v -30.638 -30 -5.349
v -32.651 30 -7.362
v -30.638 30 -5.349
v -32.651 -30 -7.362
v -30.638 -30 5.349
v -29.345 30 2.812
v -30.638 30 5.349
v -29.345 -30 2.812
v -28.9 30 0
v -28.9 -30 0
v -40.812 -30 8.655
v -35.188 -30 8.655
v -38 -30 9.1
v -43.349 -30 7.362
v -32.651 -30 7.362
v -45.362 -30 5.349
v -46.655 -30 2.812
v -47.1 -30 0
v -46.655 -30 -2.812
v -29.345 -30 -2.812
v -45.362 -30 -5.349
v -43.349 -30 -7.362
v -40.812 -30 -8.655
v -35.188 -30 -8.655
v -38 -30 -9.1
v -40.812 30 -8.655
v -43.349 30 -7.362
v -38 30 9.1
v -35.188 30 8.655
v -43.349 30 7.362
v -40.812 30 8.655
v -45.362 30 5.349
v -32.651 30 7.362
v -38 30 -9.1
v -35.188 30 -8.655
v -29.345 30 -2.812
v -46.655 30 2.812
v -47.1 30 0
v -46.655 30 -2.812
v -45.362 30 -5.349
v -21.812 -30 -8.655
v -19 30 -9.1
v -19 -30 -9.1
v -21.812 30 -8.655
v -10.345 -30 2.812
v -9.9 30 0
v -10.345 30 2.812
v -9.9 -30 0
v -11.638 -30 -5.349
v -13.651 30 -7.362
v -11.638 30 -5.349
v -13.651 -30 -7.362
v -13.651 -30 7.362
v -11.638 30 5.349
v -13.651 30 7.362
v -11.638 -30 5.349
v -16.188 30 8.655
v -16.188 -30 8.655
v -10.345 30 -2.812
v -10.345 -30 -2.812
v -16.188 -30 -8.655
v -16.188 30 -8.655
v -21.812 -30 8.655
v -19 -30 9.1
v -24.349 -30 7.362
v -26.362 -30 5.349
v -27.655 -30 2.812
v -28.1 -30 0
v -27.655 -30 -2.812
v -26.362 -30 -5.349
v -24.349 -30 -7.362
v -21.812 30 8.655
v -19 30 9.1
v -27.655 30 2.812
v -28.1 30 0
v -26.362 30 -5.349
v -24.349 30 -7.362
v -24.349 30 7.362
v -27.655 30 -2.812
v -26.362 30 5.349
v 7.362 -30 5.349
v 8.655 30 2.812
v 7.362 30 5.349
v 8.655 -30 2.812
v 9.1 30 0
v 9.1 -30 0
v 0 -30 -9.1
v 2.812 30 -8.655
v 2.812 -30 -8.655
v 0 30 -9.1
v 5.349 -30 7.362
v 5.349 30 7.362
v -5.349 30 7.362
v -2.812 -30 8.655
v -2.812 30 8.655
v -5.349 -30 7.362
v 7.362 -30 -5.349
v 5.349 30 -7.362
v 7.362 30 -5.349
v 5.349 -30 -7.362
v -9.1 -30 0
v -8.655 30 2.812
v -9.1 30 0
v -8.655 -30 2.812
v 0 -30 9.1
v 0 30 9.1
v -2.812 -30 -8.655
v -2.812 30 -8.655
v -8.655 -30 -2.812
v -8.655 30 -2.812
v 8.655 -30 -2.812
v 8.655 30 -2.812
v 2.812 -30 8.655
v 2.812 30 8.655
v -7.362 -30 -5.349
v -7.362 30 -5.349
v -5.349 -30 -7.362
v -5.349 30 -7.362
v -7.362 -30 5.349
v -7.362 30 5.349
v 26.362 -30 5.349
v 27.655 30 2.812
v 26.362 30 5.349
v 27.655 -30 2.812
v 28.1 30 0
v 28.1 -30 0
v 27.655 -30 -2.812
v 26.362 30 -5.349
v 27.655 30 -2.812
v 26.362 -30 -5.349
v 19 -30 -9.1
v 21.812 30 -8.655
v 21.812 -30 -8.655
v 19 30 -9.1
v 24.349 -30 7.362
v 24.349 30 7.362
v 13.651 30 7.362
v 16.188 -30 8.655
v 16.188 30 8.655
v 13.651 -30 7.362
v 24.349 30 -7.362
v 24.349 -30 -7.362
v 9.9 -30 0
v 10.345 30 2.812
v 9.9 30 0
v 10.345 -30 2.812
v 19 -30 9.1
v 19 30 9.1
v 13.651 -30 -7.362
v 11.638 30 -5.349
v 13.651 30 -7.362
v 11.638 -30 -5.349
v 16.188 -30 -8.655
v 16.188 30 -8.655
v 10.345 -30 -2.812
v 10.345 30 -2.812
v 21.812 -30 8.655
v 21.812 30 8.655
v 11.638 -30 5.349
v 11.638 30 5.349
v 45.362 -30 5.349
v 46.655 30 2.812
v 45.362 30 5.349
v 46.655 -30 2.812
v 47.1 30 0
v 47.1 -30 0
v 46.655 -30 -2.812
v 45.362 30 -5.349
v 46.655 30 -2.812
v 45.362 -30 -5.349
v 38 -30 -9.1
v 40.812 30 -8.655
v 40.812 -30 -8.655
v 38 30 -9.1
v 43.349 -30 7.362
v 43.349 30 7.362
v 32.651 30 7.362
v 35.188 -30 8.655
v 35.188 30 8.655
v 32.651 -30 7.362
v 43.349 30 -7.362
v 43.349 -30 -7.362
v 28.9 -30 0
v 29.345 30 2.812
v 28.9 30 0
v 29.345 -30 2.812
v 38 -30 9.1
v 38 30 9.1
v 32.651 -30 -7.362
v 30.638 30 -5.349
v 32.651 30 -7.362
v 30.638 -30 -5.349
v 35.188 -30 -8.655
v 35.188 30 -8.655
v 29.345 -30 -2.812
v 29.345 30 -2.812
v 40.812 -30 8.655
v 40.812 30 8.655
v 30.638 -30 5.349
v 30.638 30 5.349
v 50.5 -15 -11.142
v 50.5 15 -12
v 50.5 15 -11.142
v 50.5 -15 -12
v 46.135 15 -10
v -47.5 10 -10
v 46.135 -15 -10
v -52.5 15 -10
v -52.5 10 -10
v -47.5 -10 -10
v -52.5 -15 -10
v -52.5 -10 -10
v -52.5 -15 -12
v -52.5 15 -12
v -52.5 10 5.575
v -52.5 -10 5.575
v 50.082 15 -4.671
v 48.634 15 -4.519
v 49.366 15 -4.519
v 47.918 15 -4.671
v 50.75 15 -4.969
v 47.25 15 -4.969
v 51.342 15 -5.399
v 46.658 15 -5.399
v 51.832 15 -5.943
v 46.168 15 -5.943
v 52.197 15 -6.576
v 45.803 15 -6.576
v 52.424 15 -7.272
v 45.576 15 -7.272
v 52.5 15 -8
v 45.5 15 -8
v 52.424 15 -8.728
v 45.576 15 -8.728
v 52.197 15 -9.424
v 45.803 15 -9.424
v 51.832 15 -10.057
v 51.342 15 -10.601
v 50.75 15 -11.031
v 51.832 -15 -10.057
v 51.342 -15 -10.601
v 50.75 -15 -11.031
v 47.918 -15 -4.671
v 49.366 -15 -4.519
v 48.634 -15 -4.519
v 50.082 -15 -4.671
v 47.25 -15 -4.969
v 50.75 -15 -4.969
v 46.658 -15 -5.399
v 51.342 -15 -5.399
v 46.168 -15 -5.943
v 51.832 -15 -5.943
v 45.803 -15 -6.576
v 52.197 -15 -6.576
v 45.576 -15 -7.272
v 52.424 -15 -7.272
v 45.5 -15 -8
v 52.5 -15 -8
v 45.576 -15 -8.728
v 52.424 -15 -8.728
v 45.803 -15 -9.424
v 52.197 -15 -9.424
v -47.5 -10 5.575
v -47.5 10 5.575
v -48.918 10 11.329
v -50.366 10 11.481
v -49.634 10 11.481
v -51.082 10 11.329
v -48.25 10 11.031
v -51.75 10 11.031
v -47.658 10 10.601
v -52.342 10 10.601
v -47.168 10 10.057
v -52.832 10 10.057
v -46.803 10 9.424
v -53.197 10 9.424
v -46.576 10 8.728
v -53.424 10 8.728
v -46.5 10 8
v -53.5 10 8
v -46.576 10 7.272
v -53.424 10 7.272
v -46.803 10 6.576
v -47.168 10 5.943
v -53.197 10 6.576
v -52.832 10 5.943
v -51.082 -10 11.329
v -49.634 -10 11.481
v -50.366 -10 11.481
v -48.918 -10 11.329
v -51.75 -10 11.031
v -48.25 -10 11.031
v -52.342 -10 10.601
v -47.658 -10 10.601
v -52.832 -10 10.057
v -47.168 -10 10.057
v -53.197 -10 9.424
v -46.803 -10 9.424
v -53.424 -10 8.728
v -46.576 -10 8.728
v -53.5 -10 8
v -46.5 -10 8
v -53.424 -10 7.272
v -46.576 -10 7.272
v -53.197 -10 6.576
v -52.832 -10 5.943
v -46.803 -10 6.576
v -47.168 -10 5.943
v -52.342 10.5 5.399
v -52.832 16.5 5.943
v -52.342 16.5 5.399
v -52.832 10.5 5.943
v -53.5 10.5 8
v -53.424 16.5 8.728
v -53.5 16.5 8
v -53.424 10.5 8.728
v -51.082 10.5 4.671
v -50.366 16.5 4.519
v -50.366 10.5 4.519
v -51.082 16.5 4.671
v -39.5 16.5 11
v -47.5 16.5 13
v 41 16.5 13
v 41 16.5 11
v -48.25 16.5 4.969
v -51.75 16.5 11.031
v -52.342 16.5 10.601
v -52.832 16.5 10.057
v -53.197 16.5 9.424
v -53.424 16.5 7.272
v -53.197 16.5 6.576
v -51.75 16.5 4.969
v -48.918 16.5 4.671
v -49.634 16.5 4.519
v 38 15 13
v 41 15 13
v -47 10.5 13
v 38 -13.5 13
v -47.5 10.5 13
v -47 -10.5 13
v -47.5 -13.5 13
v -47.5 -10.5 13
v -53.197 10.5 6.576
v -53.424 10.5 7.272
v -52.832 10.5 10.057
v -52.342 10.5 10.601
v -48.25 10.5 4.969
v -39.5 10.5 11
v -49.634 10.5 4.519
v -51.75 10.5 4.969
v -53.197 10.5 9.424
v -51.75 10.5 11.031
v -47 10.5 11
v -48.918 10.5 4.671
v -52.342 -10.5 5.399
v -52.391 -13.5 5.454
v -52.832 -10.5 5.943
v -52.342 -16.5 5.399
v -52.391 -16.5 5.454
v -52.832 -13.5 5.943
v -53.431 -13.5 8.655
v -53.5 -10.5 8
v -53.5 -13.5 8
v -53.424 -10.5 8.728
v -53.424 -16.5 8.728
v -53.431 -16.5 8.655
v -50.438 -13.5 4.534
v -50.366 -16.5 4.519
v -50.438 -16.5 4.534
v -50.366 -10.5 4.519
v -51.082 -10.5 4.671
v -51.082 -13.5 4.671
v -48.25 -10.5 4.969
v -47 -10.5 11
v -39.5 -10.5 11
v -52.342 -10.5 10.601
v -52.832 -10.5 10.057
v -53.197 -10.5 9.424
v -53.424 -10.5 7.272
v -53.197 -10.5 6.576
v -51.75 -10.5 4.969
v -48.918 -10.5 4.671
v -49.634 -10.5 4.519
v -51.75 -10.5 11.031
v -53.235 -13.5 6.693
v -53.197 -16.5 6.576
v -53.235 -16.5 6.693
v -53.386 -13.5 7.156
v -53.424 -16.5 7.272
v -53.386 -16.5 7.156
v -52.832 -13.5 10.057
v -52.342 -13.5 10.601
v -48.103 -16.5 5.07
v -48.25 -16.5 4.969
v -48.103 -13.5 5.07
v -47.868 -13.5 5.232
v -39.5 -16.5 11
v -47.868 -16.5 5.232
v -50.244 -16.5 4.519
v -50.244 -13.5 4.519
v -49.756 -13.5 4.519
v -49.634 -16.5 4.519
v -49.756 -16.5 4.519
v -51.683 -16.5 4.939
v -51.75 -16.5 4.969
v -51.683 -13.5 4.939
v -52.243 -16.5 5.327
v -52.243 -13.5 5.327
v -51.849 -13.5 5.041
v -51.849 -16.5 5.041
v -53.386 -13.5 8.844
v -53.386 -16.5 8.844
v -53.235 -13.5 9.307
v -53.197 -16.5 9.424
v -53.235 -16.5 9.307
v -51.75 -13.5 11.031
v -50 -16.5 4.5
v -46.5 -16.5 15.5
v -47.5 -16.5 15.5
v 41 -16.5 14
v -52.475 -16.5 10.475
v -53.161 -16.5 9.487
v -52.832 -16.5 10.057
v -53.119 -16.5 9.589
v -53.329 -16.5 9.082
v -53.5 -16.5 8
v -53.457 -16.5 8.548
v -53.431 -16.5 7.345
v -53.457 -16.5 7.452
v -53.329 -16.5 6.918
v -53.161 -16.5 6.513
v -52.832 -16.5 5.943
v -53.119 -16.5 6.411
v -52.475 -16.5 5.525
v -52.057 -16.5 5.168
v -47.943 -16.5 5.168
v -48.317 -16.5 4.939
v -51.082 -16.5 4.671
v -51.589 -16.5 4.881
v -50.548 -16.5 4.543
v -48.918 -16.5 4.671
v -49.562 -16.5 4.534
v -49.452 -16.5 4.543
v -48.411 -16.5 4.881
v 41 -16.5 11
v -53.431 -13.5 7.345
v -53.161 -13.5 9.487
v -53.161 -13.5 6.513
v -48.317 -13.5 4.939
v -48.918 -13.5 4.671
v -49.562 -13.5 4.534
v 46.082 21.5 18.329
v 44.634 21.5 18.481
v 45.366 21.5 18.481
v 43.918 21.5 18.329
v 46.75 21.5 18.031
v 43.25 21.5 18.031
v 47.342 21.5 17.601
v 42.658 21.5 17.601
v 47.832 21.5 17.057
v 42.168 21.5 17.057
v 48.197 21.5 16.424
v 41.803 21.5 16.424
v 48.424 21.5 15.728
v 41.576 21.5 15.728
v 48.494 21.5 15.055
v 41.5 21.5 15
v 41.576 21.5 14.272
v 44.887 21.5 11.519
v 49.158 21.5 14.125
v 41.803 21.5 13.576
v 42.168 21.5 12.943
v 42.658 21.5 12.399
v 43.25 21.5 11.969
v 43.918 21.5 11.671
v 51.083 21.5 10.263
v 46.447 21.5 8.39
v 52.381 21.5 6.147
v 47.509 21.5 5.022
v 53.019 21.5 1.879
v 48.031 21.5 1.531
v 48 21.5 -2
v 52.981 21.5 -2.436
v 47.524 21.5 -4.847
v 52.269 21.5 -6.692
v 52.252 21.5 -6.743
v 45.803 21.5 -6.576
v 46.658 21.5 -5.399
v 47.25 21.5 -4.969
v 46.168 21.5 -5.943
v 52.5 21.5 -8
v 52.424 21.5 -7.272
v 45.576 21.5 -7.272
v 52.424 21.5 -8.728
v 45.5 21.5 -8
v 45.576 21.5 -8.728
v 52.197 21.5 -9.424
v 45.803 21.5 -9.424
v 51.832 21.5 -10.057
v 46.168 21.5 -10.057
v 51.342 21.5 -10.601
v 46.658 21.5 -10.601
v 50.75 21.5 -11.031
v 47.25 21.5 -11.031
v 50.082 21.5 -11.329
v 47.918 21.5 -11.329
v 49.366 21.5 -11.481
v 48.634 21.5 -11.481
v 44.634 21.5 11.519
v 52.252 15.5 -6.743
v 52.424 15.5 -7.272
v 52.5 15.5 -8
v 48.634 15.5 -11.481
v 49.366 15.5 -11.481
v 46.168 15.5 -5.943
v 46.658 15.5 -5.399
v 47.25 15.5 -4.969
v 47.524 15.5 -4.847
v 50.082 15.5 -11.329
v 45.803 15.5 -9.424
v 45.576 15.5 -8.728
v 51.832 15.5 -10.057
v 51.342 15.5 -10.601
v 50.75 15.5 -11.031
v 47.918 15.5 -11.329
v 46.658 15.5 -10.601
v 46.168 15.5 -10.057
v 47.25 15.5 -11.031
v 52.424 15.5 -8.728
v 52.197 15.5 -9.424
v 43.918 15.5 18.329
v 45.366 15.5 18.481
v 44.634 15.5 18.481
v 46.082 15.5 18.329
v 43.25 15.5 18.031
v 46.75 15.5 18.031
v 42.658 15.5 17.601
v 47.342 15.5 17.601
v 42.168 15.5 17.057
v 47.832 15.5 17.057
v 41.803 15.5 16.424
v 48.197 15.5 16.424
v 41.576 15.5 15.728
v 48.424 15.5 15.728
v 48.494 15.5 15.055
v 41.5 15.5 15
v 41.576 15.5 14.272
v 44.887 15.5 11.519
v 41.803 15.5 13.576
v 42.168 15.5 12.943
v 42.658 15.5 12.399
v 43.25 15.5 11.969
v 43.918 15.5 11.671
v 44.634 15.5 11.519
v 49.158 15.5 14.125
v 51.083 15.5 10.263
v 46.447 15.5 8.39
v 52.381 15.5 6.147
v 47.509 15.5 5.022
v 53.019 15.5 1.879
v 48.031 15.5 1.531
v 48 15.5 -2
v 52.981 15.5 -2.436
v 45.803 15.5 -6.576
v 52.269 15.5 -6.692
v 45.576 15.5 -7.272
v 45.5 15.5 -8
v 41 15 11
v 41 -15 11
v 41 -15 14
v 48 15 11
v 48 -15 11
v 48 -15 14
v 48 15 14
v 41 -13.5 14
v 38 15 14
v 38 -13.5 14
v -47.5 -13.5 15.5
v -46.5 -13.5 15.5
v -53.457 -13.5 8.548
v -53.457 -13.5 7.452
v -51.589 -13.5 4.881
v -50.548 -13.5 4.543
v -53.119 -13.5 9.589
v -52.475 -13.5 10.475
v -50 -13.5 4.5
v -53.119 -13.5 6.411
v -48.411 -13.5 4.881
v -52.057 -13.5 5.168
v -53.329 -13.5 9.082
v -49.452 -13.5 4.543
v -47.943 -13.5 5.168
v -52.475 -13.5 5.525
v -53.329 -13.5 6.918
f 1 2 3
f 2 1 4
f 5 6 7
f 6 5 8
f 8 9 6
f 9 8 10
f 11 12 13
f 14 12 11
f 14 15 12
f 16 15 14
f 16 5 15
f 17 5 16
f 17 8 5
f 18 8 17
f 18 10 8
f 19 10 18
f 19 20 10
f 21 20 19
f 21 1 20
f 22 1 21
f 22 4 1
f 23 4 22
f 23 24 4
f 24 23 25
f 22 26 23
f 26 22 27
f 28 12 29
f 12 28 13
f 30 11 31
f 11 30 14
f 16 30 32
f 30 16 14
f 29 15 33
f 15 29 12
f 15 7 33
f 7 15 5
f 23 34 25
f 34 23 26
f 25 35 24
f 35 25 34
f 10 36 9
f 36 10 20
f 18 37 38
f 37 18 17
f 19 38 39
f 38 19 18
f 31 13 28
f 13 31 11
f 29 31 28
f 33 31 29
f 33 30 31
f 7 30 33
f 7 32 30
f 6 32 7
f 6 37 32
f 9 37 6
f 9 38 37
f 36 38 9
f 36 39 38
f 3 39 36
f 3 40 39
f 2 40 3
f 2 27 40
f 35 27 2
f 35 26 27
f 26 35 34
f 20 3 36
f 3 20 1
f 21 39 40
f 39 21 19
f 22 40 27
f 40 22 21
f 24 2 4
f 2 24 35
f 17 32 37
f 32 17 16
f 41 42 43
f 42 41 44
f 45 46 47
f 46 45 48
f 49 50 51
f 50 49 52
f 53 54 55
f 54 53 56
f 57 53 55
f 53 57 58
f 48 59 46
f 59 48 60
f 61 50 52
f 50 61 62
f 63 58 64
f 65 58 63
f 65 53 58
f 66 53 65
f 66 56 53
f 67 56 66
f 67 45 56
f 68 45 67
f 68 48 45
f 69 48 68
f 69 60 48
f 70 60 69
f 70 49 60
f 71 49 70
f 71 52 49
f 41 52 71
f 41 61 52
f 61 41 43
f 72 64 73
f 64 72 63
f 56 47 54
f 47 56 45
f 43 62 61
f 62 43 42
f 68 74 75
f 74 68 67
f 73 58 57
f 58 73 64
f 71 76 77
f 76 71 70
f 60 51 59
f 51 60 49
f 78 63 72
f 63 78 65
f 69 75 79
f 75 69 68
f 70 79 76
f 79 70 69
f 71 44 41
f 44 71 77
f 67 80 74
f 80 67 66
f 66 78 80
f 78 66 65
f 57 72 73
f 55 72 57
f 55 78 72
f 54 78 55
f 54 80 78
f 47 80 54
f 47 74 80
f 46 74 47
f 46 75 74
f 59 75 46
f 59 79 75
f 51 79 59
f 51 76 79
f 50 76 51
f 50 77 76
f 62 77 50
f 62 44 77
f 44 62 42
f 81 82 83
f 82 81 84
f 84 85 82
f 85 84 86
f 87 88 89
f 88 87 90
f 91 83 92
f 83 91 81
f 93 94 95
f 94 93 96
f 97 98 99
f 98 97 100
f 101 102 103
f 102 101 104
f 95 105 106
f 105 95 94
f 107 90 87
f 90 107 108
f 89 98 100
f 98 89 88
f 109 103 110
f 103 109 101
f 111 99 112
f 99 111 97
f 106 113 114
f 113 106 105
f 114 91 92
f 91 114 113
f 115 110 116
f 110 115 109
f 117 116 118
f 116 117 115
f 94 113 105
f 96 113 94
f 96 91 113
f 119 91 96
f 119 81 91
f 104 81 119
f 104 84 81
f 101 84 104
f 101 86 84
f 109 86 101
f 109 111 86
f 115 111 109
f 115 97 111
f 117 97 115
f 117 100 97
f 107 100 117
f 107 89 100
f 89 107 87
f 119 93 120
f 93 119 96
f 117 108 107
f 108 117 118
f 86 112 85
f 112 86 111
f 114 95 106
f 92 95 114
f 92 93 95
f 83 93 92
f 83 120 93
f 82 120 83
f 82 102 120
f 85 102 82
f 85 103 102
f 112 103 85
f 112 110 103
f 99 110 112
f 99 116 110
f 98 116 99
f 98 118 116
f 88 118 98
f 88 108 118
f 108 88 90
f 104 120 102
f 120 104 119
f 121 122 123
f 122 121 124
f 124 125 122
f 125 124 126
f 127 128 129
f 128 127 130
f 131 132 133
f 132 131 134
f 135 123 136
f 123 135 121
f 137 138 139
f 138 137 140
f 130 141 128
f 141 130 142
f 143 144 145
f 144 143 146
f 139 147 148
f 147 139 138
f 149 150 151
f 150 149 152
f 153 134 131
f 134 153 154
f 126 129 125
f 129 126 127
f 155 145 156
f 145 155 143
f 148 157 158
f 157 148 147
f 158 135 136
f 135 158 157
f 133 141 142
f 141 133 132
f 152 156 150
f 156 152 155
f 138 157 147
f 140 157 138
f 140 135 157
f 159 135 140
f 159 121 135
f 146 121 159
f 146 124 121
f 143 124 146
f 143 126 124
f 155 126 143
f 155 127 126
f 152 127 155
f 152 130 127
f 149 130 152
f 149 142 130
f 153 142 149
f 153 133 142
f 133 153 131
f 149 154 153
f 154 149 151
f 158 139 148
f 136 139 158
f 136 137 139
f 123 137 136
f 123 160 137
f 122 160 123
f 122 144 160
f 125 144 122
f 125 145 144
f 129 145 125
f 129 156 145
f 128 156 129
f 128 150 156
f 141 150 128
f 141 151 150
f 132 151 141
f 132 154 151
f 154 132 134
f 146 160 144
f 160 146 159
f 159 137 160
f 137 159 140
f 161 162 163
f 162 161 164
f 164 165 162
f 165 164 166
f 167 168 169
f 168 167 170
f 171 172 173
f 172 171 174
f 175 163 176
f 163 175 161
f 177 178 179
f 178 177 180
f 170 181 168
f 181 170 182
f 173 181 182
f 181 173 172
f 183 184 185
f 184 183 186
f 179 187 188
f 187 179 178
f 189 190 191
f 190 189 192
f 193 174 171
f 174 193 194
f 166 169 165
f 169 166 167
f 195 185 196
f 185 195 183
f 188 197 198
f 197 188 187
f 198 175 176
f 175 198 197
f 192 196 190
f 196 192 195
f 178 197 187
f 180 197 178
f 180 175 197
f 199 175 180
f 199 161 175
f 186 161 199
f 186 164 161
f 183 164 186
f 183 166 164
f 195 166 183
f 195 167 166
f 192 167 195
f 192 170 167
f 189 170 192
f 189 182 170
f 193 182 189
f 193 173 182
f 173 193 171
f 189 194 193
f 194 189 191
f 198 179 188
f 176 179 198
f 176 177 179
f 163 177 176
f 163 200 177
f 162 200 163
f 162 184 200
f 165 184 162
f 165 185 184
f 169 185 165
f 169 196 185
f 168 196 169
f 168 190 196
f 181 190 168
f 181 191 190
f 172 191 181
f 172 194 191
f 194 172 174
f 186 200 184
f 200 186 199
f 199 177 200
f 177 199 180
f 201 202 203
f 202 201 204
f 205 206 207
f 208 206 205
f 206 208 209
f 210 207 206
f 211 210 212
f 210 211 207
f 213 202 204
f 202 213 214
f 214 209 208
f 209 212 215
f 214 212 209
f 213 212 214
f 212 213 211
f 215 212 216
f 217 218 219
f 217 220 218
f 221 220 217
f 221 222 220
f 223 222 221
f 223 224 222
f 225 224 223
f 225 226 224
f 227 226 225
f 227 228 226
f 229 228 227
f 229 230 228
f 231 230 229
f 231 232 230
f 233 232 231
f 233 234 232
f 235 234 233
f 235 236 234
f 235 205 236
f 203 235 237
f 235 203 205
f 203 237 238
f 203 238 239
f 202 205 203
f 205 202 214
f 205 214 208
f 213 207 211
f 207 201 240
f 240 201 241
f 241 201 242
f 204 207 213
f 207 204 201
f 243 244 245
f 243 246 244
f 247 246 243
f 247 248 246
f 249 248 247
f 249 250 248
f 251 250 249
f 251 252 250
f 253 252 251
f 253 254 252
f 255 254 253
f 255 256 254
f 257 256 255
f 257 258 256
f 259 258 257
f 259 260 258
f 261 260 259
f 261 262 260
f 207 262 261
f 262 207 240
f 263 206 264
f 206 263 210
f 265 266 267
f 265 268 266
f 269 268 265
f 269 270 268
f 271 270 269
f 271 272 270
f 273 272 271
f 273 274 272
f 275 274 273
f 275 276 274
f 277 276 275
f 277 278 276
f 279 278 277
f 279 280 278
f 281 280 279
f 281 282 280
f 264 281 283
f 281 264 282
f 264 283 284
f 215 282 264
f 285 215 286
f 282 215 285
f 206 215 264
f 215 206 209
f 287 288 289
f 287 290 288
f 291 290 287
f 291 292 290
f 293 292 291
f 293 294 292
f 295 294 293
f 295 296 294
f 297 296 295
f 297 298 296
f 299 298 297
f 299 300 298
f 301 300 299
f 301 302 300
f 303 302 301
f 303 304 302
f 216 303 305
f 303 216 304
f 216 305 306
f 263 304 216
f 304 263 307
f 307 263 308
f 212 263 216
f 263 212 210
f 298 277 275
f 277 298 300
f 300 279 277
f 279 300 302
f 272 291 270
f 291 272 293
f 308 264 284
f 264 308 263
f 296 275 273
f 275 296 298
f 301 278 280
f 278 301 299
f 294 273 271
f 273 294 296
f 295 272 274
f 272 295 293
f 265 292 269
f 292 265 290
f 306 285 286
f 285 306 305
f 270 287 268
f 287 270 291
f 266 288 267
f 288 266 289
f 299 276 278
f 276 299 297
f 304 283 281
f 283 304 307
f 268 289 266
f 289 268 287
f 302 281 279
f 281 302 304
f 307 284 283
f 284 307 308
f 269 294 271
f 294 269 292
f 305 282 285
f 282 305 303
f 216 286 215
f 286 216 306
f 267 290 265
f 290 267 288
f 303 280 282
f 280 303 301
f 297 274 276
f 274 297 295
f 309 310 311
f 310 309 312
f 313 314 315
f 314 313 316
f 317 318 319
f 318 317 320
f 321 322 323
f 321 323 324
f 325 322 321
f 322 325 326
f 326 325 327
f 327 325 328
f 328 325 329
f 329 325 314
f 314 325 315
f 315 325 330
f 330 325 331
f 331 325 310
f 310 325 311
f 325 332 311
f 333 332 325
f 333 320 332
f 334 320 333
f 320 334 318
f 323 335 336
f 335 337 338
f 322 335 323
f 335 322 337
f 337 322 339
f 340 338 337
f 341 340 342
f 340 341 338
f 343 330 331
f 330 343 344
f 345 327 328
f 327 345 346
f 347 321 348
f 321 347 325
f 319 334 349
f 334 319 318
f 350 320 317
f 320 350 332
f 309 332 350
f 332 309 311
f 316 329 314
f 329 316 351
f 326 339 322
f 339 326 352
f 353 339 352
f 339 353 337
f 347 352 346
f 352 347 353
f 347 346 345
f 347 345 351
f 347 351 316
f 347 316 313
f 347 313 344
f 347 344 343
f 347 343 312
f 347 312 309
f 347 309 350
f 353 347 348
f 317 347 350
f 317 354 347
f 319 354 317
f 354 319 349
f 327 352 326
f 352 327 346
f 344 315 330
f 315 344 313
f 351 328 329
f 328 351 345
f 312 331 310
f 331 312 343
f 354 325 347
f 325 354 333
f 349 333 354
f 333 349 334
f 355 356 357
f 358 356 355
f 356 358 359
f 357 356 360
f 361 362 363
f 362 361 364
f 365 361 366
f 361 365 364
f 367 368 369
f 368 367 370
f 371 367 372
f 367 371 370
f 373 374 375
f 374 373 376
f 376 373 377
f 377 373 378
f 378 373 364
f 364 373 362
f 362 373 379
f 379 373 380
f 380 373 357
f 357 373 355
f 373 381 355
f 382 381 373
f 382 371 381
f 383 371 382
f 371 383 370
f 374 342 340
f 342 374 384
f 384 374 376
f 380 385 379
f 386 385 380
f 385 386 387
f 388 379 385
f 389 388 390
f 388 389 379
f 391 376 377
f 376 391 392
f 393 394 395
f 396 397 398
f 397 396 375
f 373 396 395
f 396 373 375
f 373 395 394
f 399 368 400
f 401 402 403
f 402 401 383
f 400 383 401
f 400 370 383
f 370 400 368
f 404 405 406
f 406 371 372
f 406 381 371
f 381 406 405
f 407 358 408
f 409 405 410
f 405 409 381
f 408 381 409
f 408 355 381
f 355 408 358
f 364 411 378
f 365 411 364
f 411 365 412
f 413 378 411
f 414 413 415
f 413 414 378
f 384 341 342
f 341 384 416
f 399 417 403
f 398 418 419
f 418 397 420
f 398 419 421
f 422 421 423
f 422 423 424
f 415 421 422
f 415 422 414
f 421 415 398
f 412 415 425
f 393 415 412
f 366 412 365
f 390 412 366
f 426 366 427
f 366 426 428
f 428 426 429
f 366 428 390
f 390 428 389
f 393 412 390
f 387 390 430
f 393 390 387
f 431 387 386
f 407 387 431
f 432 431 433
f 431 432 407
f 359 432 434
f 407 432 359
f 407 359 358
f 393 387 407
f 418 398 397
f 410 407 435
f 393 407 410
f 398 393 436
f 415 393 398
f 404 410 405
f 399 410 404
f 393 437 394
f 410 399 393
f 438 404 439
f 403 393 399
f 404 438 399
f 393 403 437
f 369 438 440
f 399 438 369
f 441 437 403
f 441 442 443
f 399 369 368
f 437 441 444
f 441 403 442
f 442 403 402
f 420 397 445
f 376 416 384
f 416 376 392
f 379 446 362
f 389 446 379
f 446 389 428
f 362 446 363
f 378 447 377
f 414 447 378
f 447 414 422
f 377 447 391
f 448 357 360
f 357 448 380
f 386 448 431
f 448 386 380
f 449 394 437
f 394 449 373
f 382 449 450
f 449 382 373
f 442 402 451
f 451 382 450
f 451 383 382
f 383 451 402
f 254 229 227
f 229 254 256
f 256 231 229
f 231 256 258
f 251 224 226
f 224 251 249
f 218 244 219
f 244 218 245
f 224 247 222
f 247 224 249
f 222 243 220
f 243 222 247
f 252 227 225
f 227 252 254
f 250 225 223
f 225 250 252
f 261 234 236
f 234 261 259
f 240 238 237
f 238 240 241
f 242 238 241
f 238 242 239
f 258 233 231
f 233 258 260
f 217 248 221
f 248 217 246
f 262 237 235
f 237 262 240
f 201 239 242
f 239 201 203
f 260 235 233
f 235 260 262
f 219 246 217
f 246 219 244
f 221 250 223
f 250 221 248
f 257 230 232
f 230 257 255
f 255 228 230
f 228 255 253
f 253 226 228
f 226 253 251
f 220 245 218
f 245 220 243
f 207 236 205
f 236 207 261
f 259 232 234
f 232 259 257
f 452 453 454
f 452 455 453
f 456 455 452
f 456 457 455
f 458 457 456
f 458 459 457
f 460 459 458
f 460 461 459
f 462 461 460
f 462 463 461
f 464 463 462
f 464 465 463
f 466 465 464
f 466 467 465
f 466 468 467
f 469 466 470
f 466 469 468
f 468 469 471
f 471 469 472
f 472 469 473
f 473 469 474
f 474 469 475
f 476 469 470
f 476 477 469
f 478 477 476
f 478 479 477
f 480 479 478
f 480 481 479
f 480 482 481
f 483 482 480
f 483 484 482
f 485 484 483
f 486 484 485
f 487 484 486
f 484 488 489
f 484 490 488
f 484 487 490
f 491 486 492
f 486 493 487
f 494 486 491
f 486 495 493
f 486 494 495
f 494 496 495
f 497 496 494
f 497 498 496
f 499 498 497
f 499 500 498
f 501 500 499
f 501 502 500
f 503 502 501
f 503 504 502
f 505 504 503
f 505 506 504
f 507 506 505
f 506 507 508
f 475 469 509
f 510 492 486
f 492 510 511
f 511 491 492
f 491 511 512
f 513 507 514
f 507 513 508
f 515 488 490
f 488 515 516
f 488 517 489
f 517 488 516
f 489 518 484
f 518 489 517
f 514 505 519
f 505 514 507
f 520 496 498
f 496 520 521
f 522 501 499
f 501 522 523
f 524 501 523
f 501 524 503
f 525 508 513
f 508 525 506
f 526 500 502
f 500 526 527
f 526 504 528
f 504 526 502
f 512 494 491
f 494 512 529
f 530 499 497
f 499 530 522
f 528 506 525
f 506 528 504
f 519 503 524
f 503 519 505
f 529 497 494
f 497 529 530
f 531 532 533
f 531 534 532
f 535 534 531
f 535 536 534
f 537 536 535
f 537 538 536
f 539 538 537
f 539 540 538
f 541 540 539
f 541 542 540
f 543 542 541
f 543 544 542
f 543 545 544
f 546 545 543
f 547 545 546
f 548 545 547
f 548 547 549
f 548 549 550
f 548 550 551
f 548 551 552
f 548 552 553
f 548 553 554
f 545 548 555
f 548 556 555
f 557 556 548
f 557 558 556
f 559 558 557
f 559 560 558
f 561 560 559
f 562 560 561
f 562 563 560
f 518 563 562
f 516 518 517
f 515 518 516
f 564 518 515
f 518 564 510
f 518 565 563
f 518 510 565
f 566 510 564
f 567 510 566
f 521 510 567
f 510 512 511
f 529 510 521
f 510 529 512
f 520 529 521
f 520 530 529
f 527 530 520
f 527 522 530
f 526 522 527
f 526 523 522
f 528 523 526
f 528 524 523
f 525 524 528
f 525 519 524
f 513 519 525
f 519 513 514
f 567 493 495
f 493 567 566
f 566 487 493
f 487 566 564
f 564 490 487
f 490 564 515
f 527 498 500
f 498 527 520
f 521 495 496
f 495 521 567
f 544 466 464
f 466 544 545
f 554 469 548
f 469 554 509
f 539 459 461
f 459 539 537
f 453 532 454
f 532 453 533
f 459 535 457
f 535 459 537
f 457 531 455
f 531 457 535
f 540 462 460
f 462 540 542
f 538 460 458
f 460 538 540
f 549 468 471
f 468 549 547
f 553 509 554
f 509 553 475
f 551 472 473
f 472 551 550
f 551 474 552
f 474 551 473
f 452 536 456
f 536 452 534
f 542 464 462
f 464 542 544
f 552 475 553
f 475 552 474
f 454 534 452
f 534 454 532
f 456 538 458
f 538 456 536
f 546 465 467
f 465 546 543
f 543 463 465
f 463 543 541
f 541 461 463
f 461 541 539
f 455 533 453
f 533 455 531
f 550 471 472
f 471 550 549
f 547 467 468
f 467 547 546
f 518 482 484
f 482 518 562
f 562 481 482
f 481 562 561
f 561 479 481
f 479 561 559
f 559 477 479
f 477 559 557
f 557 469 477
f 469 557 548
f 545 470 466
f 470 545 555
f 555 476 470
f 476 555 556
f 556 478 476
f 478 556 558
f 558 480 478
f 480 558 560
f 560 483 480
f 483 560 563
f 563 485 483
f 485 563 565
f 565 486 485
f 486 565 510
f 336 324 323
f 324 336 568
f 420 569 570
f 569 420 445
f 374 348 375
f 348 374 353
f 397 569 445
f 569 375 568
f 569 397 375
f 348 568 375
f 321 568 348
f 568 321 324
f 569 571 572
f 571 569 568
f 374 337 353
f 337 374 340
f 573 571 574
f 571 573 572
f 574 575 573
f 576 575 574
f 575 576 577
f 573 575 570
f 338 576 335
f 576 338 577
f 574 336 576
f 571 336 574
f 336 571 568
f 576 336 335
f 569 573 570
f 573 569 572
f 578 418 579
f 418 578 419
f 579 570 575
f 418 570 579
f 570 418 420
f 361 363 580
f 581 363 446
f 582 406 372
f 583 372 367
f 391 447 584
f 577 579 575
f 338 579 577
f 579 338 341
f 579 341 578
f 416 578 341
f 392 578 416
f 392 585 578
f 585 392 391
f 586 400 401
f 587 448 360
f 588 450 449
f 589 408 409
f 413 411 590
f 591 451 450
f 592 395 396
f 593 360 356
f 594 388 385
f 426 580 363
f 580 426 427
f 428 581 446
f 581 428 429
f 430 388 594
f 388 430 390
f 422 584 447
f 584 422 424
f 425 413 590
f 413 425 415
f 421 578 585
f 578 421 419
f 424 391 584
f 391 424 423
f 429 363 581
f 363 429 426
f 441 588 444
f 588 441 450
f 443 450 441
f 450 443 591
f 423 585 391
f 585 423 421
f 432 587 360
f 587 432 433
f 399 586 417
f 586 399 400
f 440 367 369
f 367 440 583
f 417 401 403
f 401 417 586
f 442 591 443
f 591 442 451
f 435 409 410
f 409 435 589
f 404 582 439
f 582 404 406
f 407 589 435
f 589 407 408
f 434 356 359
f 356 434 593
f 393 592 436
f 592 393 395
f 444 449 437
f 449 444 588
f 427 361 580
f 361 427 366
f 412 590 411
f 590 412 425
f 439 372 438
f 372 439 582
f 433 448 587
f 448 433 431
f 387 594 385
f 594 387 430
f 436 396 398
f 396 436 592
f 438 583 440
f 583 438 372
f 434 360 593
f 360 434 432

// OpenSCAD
$fn=40;
//batteries
for(i=[-19*2:19:19*2])translate([i,0,0])rotate([90,0,0])cylinder(d=18.2,h=60,center=true,$fn=20);
    
translate([-1,0,-11])cube([103,30,2],true); // bottom
//left
translate([-50,0,-2])cube([5,20,18],true);
translate([-50,0,8])rotate([90,0,0])cylinder(d=7,h=20,center=true, $fn=30);
translate([-50,13.5,12])petlja();
translate([-50,-13.5,12])petlja();

//right
translate([49,0,-8])rotate([90,0,0])cylinder(d=7,h=30,center=true, $fn=30);

translate([49,18.5,-8])rotate([90,0,0])cylinder(d=7,h=6,center=true, $fn=30);
translate([45,18.5,15])rotate([90,0,0])cylinder(d=7,h=6,center=true, $fn=30);
translate([48,15.5,-2])rotate([0,5,0])lock();

//translate([49,-18.5,-8])rotate([90,0,0])cylinder(d=7,h=6,center=true, $fn=30);


translate([-3,0,12])cube([88,33,2],true); // top
translate([43,0,12.5])cube([10,30,3],true); // top
//translate([-3,15,13])cube([88,3,2],true); // top
hull(){
    translate([-47,-15,14])cube([1,3,3],true); // top
    translate([40.5,-15,13])cube([1,3,2],true); // top
}
hull(){
    translate([-50,-13.5,8])rotate([90,0,0],center=true)cylinder(d=7,h=3);
    translate([-47,-15,14])cube([1,3,3],true); // top
}

module petlja(){
    hull(){
        translate([0,0,-4])rotate([90,0,0])cylinder(d=7,h=6,center=true, $fn=30);
        translate([10,0,0])cube([1,6,2],true);
        translate([3,0,0])cube([1,6,2],true);
    }
}

module lock(){
    translate([-45/2,0,0])rotate([90,0,180])linear_extrude(height=6)intersection(){
        difference(){
            circle(d=45+10);
            circle(d=45);
            translate([0,6])rotate([0,0,-40])square([60,10],true);
        }
        translate([-15,6])square([30,25],true);
    }
}
